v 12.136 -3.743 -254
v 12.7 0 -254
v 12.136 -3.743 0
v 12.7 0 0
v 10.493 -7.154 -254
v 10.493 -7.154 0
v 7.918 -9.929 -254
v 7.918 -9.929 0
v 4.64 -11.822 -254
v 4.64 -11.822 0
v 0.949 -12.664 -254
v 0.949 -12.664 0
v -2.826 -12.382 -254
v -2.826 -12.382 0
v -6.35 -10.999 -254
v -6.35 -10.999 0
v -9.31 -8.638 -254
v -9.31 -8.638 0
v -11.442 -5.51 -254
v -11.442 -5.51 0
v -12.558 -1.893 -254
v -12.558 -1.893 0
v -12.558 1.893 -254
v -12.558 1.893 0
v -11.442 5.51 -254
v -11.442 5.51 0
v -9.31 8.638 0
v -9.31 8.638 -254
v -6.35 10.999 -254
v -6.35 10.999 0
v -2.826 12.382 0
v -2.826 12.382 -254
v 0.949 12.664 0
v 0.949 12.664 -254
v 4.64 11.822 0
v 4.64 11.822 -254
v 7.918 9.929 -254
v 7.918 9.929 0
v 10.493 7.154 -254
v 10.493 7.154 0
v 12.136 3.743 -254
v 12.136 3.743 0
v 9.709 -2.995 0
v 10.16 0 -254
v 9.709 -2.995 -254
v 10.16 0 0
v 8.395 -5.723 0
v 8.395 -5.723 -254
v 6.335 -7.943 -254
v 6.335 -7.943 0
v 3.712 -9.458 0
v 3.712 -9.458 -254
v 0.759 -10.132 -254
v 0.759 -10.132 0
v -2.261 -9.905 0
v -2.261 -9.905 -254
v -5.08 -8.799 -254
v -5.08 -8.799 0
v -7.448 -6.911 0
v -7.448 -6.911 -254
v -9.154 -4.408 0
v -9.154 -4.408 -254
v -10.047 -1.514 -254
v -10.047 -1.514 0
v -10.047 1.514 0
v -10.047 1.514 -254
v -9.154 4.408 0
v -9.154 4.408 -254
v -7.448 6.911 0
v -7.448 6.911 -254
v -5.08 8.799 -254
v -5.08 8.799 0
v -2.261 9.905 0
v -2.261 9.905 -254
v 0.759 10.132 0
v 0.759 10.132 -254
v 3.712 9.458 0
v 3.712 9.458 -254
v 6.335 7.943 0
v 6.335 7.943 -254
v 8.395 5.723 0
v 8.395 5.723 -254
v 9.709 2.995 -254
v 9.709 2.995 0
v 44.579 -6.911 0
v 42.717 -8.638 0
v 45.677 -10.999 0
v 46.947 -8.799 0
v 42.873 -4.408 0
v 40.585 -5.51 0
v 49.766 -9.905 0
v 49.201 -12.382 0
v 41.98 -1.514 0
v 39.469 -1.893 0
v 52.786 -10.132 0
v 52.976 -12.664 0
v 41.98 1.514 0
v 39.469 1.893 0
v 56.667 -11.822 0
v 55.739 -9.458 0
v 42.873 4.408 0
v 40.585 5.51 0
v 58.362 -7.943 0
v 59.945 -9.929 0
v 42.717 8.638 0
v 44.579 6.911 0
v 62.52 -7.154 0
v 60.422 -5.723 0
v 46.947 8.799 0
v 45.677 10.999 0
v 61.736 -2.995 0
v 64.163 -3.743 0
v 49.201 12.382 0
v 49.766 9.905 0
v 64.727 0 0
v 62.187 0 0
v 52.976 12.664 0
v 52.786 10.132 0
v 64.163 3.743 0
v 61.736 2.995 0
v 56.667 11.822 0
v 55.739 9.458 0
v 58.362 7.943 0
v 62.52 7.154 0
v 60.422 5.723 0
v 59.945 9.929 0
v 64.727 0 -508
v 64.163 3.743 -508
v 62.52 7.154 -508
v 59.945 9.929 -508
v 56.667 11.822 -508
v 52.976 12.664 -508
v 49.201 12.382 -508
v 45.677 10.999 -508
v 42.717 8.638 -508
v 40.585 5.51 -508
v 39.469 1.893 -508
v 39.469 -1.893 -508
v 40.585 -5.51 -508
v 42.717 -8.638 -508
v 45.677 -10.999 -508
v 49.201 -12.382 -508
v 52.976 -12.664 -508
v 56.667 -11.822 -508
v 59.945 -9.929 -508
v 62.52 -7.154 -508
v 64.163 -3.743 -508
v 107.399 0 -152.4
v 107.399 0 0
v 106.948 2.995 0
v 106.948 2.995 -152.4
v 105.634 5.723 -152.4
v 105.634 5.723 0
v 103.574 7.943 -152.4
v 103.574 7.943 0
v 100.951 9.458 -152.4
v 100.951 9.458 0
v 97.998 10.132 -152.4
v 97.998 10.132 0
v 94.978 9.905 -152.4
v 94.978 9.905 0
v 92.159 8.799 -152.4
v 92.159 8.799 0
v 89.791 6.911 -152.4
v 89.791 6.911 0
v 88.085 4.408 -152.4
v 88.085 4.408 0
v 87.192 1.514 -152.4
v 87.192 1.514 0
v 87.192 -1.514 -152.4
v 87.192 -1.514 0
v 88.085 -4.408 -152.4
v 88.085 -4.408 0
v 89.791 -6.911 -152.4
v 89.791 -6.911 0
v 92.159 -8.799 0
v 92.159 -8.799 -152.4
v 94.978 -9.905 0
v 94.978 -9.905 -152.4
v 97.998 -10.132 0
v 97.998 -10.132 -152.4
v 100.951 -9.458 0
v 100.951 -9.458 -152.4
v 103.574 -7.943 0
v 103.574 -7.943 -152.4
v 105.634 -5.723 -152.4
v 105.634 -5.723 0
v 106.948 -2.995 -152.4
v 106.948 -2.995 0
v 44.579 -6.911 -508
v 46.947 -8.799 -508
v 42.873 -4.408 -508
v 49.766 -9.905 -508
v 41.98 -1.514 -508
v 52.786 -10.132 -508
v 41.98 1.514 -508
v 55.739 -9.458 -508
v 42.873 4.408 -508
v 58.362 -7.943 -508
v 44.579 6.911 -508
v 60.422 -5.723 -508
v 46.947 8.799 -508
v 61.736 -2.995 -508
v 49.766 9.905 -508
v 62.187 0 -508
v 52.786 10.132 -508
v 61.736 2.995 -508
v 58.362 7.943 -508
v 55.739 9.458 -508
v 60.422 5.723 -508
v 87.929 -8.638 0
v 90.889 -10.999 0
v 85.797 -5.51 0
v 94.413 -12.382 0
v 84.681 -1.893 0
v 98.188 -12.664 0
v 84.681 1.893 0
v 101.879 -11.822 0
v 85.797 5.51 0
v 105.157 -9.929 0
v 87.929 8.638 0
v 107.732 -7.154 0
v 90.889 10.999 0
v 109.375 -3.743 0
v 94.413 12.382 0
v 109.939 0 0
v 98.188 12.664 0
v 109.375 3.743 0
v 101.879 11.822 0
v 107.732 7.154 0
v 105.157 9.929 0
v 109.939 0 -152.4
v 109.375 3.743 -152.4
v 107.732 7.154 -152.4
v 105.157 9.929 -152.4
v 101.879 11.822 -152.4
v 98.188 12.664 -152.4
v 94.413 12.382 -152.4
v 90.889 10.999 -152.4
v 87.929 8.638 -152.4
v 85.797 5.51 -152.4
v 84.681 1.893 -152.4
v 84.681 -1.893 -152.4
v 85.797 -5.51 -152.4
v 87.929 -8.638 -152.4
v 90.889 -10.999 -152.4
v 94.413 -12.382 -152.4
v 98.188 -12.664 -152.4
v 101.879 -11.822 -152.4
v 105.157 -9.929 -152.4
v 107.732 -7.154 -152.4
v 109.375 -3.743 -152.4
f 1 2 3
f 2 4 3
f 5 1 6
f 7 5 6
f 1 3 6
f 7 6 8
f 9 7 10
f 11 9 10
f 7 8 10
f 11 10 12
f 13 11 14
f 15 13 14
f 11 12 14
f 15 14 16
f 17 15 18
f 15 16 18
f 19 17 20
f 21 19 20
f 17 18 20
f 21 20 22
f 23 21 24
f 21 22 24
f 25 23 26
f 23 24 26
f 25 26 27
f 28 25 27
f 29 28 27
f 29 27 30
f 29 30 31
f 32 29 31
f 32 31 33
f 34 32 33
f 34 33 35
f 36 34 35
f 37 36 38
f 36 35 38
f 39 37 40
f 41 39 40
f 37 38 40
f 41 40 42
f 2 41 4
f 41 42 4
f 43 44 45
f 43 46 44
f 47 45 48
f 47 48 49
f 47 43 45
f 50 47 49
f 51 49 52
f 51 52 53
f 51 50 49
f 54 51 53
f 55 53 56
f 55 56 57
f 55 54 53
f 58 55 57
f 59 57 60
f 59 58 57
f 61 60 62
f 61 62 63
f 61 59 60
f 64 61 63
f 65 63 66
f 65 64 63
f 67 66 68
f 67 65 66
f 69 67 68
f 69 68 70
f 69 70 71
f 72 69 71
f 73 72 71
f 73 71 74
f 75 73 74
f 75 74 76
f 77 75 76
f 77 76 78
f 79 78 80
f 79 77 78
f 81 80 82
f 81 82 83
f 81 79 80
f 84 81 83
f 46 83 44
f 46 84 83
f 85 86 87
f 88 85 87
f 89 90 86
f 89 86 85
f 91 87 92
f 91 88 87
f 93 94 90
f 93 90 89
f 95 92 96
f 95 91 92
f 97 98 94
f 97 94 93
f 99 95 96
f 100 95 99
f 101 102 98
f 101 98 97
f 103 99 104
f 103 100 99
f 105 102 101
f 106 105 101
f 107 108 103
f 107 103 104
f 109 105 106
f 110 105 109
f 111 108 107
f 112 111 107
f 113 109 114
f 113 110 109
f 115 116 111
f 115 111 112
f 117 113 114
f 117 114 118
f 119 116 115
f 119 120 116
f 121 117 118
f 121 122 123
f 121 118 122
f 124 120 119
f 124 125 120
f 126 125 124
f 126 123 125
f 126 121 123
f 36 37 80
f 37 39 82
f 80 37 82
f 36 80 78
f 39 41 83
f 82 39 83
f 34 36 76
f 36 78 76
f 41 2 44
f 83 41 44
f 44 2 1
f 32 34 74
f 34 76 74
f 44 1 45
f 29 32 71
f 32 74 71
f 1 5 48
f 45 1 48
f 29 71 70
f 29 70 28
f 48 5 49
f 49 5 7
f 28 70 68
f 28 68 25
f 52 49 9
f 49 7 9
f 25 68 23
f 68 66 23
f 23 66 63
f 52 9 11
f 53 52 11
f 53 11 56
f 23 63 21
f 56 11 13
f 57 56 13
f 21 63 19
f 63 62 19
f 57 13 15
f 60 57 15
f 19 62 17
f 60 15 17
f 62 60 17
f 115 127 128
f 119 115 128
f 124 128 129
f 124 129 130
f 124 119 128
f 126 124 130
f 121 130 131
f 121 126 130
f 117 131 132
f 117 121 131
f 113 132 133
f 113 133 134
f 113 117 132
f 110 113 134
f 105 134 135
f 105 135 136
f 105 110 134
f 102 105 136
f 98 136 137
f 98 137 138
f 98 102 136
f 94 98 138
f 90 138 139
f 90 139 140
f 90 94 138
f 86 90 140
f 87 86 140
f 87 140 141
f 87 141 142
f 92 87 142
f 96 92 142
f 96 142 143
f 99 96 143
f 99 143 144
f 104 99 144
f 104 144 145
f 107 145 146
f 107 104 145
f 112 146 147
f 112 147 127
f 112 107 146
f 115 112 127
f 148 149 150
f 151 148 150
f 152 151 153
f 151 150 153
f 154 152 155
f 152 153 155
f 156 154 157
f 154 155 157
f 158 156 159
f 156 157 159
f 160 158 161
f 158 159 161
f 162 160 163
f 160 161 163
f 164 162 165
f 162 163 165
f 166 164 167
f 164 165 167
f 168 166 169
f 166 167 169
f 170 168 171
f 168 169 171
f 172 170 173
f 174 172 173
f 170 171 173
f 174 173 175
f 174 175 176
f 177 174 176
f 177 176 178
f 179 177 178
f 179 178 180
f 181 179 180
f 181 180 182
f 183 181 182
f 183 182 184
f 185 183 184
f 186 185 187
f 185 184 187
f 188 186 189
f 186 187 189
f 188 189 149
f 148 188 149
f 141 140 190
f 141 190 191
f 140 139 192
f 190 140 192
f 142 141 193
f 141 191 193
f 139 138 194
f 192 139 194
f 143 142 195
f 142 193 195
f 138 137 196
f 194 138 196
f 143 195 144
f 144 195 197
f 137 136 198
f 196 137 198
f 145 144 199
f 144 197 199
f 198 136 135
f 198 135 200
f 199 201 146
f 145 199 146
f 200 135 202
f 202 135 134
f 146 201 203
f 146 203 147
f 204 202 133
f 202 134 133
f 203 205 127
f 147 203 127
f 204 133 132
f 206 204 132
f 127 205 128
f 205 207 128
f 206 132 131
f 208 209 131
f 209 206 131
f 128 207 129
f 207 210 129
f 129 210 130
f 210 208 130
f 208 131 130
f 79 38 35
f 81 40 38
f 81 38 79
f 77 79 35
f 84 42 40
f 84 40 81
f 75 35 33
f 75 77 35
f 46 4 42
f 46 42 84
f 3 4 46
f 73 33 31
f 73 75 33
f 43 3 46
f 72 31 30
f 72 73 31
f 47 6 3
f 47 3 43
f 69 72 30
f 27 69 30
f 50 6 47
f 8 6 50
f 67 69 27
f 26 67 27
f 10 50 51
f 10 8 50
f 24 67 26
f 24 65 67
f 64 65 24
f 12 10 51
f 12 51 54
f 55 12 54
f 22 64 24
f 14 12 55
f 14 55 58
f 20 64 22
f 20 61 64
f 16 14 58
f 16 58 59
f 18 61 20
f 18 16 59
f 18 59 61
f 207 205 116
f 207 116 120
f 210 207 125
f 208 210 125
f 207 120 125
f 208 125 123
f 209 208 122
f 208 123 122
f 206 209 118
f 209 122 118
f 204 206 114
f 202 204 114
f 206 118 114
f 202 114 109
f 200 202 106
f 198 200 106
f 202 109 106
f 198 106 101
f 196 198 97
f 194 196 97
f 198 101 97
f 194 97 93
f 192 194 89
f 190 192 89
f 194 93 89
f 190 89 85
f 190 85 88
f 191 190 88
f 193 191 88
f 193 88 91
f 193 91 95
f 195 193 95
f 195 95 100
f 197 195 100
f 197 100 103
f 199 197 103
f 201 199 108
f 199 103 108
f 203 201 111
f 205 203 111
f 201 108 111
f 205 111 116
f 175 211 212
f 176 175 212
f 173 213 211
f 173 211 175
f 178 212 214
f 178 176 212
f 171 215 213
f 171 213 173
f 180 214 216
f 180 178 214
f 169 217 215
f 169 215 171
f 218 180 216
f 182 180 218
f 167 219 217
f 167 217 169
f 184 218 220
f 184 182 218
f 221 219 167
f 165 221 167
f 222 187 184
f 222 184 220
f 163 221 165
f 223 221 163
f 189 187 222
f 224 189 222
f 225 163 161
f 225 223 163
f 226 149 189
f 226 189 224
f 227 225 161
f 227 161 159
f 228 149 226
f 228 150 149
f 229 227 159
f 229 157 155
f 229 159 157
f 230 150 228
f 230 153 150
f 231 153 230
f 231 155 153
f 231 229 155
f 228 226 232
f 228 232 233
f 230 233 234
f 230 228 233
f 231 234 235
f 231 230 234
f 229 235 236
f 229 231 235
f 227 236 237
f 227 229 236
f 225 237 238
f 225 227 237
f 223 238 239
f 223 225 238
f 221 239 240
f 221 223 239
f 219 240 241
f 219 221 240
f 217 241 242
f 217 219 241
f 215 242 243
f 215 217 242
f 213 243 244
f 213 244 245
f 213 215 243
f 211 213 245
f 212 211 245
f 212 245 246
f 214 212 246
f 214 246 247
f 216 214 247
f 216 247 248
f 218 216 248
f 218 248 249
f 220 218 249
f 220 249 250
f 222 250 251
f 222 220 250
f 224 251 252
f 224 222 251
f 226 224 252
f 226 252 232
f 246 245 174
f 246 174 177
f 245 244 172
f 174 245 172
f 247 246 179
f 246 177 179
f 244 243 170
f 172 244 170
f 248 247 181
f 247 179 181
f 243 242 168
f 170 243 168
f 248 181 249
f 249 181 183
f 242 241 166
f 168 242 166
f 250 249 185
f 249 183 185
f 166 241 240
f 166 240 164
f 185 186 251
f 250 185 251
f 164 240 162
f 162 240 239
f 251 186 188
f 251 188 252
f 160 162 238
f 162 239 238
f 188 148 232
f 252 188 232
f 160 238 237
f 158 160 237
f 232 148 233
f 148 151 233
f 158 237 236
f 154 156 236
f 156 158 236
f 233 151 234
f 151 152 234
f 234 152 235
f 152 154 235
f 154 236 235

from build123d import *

# Parameters (mm, degrees)
F0_W     = 2.54
F0_H     = 254
F2_R     = 12.7
F2_R_2   = 10.16
F3_DEPTH = 508
F4_DEPTH = 152.4


with BuildPart() as f1:
    # F0 (on Front) → F1 (revolve)
    with BuildSketch(Plane.XZ):
        with Locations((11.43, -127)):
            Rectangle(F0_W, F0_H)
    revolve(axis=Axis((0, 0, -67.646876), (0, 0, -1)))


with BuildPart() as f3:
    # F2 (on Top) → F3 (new body)
    with BuildSketch(Plane.XY):
        with Locations((52.027021, 0)):
            Circle(F2_R)
        with Locations((52.027021, 0)):
            Circle(F2_R_2, mode=Mode.SUBTRACT)
    extrude(amount=-F3_DEPTH)


with BuildPart() as f4:
    # F2 (on Top) → F4 (new body)
    with BuildSketch(Plane.XY):
        with Locations((97.239021, 0)):
            Circle(F2_R)
        with Locations((97.239021, 0)):
            Circle(F2_R_2, mode=Mode.SUBTRACT)
    extrude(amount=-F4_DEPTH)


solid = Compound([f1.part, f3.part, f4.part])
